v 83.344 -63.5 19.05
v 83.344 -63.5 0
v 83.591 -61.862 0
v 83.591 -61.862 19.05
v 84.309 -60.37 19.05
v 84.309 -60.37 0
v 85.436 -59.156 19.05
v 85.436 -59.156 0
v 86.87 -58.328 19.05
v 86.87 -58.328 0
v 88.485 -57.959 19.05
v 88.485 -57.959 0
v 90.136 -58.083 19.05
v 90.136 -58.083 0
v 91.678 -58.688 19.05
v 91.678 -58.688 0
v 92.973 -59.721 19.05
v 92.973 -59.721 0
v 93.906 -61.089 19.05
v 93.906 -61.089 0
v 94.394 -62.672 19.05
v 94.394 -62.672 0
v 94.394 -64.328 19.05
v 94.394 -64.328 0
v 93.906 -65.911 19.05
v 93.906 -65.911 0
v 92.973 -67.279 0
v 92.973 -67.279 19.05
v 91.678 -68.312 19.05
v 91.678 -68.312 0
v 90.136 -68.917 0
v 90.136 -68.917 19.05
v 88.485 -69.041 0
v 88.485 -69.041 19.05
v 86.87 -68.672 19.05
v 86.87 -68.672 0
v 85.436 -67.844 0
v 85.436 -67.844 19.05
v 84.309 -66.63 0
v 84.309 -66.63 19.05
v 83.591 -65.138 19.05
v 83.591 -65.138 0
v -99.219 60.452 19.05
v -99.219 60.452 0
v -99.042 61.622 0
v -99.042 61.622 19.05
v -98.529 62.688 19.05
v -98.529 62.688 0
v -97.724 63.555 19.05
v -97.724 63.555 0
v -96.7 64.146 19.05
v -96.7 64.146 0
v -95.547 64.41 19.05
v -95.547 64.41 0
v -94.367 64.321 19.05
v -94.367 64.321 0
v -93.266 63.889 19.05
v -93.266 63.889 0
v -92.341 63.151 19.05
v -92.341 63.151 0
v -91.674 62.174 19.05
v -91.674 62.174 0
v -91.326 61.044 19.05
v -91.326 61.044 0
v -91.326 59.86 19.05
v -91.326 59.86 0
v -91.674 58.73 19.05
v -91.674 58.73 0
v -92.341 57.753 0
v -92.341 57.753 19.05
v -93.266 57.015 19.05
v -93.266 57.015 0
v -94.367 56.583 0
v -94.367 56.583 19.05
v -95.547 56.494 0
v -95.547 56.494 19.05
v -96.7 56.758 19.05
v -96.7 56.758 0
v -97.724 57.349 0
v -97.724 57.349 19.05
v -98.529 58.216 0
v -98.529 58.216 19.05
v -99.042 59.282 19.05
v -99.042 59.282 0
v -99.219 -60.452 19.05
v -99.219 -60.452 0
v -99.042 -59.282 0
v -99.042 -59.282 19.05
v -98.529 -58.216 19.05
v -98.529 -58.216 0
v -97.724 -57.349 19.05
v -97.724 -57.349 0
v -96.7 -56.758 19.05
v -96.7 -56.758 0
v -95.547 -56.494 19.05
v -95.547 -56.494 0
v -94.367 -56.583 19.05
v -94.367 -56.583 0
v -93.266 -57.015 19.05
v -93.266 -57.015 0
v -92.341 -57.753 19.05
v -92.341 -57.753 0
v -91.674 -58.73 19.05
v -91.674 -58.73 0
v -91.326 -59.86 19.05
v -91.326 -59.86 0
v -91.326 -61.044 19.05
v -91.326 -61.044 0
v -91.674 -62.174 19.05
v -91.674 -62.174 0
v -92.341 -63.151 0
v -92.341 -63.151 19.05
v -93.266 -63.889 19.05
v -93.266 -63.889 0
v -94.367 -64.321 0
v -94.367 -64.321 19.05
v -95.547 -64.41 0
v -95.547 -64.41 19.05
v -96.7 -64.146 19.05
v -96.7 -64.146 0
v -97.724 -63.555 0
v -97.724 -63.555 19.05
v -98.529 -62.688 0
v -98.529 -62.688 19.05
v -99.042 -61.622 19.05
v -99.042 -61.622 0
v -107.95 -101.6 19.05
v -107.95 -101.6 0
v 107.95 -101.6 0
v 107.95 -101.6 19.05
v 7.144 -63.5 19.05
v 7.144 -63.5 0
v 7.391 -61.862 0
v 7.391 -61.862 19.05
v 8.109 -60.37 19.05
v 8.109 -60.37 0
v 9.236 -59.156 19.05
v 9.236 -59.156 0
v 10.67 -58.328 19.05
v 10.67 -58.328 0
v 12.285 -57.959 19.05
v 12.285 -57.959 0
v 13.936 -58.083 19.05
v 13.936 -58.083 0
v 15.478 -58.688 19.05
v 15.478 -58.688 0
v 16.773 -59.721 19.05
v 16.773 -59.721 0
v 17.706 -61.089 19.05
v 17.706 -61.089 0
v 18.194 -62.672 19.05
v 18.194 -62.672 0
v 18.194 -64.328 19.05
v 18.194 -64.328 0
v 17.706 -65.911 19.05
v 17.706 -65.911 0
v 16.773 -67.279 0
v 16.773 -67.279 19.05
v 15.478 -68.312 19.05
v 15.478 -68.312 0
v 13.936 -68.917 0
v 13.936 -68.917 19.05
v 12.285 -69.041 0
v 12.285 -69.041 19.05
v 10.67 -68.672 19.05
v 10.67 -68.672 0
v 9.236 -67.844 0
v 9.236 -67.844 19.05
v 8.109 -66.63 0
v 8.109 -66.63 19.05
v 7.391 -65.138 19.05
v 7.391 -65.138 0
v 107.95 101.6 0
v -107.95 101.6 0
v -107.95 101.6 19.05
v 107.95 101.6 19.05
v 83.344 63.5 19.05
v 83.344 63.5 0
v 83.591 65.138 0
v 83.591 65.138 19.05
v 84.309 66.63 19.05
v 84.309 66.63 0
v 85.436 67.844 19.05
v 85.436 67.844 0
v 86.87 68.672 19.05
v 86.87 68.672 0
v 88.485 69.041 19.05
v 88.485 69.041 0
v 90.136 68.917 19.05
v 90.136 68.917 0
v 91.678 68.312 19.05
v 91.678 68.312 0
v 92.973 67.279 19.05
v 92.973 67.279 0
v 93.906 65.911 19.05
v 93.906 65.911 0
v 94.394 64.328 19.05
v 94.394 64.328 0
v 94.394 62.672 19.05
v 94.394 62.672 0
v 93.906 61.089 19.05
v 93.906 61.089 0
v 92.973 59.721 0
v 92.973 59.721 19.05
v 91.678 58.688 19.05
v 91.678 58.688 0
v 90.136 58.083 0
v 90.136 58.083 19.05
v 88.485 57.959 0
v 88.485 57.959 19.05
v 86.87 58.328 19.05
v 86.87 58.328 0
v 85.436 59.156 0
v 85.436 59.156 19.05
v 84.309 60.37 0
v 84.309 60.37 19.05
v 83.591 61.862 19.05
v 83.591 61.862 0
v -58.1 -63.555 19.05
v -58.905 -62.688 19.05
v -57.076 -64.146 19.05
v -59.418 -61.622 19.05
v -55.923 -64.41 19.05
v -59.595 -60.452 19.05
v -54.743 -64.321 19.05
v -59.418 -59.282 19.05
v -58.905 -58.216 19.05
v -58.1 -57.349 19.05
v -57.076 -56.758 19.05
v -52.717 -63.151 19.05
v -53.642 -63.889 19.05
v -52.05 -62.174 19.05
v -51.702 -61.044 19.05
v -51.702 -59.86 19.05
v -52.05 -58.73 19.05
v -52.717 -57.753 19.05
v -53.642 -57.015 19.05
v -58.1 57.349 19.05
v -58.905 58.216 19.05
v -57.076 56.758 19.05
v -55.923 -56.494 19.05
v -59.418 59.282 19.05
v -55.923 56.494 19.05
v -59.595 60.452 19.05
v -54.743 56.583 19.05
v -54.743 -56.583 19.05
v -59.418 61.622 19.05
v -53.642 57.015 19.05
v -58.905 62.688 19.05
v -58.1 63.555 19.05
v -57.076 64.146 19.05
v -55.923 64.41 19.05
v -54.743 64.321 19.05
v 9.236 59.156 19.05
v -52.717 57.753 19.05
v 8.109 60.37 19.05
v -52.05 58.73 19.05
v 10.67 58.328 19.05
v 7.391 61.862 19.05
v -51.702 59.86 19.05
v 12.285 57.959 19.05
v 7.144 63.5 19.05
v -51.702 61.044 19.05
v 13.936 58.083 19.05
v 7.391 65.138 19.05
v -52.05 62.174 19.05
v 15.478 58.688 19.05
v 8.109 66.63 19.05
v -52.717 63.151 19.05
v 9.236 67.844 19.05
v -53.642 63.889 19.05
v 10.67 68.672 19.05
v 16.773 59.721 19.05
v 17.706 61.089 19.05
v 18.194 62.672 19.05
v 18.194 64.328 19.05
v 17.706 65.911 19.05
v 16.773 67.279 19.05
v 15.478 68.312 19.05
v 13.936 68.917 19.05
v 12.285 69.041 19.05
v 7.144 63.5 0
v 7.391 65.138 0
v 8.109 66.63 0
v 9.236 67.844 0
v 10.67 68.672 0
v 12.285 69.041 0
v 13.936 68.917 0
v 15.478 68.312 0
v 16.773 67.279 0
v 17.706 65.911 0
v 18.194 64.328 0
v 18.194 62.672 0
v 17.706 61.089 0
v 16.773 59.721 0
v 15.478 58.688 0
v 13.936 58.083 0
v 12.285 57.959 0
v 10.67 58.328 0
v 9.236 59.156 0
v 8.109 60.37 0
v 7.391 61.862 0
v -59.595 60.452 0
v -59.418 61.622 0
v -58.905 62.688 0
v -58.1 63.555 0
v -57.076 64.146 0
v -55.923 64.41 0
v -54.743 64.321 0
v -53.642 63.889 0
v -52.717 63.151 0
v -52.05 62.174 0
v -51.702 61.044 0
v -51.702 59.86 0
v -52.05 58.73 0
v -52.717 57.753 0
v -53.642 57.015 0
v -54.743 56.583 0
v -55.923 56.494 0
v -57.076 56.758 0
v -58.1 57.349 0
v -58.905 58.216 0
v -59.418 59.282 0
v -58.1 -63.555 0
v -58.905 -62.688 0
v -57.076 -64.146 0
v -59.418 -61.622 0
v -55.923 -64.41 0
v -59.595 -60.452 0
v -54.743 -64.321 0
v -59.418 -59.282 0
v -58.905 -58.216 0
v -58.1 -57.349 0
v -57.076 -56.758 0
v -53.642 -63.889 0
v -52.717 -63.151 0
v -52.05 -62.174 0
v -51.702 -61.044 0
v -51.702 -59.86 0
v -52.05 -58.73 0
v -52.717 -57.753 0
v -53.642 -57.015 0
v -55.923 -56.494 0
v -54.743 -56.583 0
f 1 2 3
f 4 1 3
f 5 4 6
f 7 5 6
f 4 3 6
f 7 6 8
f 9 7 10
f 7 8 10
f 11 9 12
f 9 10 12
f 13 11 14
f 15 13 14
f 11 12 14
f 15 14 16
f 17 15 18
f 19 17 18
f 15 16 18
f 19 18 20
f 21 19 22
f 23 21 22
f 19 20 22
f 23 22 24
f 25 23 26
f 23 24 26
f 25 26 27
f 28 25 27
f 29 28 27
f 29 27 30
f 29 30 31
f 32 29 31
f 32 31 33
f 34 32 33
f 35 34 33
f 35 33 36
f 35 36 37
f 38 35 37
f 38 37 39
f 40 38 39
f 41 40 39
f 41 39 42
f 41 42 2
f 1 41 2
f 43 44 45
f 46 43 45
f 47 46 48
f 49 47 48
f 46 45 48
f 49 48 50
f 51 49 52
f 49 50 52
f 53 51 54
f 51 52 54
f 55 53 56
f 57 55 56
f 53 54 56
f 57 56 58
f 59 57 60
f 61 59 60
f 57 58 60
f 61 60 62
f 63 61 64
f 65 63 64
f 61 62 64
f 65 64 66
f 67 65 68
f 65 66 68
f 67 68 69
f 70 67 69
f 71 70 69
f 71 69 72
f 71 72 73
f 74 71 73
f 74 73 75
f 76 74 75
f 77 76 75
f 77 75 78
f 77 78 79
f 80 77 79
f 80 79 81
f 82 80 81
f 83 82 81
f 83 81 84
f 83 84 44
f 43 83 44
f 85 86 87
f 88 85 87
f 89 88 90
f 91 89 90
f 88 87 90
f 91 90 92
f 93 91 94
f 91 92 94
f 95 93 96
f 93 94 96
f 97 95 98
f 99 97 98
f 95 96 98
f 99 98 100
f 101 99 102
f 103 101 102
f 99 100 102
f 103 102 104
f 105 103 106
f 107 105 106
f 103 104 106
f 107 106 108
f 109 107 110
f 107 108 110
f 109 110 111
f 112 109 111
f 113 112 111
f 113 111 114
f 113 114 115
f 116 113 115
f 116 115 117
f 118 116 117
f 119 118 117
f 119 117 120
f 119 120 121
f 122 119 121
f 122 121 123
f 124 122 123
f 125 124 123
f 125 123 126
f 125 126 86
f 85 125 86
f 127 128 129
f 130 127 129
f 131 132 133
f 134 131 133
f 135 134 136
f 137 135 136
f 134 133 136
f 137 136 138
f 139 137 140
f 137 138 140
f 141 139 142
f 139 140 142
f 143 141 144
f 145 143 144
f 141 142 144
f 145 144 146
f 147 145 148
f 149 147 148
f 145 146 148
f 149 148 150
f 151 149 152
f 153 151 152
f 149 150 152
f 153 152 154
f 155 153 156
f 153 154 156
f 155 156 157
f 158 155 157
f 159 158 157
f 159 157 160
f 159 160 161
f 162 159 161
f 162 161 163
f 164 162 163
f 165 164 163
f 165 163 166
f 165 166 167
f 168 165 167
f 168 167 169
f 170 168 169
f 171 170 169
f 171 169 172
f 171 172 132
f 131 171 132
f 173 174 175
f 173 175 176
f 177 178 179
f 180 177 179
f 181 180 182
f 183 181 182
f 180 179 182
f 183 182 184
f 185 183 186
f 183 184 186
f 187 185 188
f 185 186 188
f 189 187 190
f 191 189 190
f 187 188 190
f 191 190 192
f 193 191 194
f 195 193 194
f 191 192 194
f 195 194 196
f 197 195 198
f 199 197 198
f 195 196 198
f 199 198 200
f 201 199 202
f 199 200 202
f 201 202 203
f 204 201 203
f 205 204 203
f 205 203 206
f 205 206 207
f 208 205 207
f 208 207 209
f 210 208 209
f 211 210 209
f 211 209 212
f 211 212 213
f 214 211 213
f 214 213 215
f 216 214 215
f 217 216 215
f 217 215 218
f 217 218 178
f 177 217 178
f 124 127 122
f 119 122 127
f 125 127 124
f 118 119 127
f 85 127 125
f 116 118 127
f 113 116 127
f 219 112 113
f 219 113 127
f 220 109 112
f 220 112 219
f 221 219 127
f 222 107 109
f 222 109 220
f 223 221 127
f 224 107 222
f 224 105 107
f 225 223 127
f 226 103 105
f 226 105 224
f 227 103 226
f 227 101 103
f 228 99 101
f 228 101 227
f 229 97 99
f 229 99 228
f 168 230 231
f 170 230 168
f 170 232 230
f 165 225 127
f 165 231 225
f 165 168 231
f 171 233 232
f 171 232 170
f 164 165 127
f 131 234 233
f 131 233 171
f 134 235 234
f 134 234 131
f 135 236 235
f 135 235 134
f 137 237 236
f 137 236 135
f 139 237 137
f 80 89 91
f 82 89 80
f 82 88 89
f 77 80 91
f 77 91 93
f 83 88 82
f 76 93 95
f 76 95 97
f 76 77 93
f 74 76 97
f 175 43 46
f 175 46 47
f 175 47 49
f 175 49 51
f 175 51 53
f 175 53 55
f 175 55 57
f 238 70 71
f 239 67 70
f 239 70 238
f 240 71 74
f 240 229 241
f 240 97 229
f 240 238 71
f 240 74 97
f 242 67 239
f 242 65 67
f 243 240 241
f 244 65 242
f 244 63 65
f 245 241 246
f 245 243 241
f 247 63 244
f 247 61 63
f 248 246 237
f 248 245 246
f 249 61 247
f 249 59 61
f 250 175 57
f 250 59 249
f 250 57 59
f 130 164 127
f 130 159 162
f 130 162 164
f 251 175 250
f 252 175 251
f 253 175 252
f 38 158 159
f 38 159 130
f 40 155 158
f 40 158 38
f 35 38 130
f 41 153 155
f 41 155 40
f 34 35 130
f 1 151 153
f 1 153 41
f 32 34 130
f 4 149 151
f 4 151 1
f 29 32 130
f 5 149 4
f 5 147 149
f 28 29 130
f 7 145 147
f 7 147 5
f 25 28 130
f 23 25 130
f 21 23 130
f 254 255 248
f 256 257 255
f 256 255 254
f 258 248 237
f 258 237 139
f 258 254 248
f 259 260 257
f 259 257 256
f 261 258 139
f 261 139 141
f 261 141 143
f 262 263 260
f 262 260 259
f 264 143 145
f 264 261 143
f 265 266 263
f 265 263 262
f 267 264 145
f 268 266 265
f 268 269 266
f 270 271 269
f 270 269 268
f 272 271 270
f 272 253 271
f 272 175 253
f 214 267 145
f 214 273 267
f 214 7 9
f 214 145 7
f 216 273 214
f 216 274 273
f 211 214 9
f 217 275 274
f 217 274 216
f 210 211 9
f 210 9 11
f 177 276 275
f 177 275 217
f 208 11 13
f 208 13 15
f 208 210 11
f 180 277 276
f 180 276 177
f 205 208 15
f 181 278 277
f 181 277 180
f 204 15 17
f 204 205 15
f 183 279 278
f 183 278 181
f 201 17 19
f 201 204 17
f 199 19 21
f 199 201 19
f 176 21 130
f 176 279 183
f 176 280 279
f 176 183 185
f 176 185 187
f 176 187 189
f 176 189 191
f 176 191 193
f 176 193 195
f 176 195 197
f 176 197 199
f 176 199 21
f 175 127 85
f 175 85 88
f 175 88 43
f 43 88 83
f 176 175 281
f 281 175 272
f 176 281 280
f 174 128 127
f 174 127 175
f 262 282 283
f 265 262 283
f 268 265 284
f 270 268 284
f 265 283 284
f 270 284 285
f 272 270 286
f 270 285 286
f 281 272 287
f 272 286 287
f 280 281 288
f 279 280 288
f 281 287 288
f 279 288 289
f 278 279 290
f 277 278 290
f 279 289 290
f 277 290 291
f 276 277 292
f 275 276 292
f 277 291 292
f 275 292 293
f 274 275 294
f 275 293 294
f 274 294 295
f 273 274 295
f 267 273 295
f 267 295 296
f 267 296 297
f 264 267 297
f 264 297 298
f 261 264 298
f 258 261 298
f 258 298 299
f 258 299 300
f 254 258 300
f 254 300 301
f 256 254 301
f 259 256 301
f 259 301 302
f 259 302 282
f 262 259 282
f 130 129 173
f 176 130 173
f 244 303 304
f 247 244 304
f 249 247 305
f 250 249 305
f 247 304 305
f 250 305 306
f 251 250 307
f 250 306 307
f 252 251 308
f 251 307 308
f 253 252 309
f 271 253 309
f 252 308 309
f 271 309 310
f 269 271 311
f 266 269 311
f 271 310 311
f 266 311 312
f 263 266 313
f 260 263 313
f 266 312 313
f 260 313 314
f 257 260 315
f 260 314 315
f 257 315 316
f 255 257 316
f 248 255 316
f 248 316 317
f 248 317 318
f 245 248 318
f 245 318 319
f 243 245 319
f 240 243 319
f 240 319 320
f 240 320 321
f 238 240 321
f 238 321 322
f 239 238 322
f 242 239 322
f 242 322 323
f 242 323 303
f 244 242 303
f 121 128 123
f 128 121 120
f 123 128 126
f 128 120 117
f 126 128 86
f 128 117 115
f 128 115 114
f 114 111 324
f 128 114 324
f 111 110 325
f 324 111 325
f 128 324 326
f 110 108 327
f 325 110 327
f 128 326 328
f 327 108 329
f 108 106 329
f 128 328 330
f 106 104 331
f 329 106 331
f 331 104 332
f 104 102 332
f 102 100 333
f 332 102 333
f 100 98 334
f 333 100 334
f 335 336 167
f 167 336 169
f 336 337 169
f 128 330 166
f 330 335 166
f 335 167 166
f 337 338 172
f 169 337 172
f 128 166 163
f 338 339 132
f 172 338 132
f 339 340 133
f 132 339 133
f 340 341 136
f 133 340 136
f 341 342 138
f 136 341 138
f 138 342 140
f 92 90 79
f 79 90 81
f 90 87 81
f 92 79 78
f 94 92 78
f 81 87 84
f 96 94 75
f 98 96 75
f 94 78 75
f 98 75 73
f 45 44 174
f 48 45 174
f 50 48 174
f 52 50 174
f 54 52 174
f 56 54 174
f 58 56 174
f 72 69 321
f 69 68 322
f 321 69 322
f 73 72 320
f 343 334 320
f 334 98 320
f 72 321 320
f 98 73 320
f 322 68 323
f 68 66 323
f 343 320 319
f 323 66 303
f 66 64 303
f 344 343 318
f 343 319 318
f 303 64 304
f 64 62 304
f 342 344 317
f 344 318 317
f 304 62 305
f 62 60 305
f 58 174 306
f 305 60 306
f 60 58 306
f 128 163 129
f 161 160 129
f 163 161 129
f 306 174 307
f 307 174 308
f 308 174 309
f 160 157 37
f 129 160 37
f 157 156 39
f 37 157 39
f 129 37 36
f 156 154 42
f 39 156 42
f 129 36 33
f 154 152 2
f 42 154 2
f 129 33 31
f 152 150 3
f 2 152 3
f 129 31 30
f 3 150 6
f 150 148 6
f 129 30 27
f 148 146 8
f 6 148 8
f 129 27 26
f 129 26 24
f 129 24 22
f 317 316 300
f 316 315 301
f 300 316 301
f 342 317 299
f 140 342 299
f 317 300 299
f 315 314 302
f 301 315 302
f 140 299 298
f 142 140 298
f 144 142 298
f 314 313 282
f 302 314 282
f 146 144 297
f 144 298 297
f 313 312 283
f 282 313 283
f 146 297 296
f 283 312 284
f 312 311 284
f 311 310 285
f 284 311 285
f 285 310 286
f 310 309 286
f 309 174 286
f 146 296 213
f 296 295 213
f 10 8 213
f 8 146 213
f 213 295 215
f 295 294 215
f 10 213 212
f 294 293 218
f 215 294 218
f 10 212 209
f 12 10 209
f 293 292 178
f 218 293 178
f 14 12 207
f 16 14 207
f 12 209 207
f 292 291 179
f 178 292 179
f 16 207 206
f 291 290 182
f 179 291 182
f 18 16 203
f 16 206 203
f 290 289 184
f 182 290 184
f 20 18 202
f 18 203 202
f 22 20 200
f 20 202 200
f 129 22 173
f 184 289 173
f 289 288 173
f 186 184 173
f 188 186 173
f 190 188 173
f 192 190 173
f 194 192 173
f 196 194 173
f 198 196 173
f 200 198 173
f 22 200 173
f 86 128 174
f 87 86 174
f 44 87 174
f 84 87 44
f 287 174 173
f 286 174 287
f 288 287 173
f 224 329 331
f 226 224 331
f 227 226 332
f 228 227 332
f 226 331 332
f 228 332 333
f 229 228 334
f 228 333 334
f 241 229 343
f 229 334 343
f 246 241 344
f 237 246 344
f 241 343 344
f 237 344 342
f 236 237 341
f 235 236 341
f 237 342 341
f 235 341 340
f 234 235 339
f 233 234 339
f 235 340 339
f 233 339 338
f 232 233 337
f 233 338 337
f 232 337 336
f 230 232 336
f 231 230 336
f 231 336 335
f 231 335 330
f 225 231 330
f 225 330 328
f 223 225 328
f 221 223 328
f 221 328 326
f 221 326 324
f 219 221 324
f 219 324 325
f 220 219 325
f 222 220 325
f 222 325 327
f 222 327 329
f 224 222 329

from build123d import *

# Parameters (mm, degrees)
F0_W     = 215.9
F0_H     = 203.2
F1_DEPTH = 19.05
F3_D     = 7.9375
F4_D     = 11.1125


# Not quite as in the source:
# - a length typed as a fraction of an inch, garbled in the dataset ("3 / 203.2 mm" for 3/8 in), is restored


with BuildPart() as f1:
    # F0 (on Top) → F1 (new body)
    with BuildSketch(Plane.XY):
        Rectangle(F0_W, F0_H)
    extrude(amount=F1_DEPTH)

    # F3 (through all)
    with Locations(Plane.XY.offset(19.05)):
        with Locations((-95.25, 60.452), (-55.626, 60.452), (-95.25, -60.452), (-55.626, -60.452)):
            Hole(F3_D / 2)

    # F4 (through all)
    with Locations(Plane.XY.offset(19.05)):
        with Locations((12.7, 63.5), (88.9, 63.5), (12.7, -63.5), (88.9, -63.5)):
            Hole(F4_D / 2)


solid = f1.part
